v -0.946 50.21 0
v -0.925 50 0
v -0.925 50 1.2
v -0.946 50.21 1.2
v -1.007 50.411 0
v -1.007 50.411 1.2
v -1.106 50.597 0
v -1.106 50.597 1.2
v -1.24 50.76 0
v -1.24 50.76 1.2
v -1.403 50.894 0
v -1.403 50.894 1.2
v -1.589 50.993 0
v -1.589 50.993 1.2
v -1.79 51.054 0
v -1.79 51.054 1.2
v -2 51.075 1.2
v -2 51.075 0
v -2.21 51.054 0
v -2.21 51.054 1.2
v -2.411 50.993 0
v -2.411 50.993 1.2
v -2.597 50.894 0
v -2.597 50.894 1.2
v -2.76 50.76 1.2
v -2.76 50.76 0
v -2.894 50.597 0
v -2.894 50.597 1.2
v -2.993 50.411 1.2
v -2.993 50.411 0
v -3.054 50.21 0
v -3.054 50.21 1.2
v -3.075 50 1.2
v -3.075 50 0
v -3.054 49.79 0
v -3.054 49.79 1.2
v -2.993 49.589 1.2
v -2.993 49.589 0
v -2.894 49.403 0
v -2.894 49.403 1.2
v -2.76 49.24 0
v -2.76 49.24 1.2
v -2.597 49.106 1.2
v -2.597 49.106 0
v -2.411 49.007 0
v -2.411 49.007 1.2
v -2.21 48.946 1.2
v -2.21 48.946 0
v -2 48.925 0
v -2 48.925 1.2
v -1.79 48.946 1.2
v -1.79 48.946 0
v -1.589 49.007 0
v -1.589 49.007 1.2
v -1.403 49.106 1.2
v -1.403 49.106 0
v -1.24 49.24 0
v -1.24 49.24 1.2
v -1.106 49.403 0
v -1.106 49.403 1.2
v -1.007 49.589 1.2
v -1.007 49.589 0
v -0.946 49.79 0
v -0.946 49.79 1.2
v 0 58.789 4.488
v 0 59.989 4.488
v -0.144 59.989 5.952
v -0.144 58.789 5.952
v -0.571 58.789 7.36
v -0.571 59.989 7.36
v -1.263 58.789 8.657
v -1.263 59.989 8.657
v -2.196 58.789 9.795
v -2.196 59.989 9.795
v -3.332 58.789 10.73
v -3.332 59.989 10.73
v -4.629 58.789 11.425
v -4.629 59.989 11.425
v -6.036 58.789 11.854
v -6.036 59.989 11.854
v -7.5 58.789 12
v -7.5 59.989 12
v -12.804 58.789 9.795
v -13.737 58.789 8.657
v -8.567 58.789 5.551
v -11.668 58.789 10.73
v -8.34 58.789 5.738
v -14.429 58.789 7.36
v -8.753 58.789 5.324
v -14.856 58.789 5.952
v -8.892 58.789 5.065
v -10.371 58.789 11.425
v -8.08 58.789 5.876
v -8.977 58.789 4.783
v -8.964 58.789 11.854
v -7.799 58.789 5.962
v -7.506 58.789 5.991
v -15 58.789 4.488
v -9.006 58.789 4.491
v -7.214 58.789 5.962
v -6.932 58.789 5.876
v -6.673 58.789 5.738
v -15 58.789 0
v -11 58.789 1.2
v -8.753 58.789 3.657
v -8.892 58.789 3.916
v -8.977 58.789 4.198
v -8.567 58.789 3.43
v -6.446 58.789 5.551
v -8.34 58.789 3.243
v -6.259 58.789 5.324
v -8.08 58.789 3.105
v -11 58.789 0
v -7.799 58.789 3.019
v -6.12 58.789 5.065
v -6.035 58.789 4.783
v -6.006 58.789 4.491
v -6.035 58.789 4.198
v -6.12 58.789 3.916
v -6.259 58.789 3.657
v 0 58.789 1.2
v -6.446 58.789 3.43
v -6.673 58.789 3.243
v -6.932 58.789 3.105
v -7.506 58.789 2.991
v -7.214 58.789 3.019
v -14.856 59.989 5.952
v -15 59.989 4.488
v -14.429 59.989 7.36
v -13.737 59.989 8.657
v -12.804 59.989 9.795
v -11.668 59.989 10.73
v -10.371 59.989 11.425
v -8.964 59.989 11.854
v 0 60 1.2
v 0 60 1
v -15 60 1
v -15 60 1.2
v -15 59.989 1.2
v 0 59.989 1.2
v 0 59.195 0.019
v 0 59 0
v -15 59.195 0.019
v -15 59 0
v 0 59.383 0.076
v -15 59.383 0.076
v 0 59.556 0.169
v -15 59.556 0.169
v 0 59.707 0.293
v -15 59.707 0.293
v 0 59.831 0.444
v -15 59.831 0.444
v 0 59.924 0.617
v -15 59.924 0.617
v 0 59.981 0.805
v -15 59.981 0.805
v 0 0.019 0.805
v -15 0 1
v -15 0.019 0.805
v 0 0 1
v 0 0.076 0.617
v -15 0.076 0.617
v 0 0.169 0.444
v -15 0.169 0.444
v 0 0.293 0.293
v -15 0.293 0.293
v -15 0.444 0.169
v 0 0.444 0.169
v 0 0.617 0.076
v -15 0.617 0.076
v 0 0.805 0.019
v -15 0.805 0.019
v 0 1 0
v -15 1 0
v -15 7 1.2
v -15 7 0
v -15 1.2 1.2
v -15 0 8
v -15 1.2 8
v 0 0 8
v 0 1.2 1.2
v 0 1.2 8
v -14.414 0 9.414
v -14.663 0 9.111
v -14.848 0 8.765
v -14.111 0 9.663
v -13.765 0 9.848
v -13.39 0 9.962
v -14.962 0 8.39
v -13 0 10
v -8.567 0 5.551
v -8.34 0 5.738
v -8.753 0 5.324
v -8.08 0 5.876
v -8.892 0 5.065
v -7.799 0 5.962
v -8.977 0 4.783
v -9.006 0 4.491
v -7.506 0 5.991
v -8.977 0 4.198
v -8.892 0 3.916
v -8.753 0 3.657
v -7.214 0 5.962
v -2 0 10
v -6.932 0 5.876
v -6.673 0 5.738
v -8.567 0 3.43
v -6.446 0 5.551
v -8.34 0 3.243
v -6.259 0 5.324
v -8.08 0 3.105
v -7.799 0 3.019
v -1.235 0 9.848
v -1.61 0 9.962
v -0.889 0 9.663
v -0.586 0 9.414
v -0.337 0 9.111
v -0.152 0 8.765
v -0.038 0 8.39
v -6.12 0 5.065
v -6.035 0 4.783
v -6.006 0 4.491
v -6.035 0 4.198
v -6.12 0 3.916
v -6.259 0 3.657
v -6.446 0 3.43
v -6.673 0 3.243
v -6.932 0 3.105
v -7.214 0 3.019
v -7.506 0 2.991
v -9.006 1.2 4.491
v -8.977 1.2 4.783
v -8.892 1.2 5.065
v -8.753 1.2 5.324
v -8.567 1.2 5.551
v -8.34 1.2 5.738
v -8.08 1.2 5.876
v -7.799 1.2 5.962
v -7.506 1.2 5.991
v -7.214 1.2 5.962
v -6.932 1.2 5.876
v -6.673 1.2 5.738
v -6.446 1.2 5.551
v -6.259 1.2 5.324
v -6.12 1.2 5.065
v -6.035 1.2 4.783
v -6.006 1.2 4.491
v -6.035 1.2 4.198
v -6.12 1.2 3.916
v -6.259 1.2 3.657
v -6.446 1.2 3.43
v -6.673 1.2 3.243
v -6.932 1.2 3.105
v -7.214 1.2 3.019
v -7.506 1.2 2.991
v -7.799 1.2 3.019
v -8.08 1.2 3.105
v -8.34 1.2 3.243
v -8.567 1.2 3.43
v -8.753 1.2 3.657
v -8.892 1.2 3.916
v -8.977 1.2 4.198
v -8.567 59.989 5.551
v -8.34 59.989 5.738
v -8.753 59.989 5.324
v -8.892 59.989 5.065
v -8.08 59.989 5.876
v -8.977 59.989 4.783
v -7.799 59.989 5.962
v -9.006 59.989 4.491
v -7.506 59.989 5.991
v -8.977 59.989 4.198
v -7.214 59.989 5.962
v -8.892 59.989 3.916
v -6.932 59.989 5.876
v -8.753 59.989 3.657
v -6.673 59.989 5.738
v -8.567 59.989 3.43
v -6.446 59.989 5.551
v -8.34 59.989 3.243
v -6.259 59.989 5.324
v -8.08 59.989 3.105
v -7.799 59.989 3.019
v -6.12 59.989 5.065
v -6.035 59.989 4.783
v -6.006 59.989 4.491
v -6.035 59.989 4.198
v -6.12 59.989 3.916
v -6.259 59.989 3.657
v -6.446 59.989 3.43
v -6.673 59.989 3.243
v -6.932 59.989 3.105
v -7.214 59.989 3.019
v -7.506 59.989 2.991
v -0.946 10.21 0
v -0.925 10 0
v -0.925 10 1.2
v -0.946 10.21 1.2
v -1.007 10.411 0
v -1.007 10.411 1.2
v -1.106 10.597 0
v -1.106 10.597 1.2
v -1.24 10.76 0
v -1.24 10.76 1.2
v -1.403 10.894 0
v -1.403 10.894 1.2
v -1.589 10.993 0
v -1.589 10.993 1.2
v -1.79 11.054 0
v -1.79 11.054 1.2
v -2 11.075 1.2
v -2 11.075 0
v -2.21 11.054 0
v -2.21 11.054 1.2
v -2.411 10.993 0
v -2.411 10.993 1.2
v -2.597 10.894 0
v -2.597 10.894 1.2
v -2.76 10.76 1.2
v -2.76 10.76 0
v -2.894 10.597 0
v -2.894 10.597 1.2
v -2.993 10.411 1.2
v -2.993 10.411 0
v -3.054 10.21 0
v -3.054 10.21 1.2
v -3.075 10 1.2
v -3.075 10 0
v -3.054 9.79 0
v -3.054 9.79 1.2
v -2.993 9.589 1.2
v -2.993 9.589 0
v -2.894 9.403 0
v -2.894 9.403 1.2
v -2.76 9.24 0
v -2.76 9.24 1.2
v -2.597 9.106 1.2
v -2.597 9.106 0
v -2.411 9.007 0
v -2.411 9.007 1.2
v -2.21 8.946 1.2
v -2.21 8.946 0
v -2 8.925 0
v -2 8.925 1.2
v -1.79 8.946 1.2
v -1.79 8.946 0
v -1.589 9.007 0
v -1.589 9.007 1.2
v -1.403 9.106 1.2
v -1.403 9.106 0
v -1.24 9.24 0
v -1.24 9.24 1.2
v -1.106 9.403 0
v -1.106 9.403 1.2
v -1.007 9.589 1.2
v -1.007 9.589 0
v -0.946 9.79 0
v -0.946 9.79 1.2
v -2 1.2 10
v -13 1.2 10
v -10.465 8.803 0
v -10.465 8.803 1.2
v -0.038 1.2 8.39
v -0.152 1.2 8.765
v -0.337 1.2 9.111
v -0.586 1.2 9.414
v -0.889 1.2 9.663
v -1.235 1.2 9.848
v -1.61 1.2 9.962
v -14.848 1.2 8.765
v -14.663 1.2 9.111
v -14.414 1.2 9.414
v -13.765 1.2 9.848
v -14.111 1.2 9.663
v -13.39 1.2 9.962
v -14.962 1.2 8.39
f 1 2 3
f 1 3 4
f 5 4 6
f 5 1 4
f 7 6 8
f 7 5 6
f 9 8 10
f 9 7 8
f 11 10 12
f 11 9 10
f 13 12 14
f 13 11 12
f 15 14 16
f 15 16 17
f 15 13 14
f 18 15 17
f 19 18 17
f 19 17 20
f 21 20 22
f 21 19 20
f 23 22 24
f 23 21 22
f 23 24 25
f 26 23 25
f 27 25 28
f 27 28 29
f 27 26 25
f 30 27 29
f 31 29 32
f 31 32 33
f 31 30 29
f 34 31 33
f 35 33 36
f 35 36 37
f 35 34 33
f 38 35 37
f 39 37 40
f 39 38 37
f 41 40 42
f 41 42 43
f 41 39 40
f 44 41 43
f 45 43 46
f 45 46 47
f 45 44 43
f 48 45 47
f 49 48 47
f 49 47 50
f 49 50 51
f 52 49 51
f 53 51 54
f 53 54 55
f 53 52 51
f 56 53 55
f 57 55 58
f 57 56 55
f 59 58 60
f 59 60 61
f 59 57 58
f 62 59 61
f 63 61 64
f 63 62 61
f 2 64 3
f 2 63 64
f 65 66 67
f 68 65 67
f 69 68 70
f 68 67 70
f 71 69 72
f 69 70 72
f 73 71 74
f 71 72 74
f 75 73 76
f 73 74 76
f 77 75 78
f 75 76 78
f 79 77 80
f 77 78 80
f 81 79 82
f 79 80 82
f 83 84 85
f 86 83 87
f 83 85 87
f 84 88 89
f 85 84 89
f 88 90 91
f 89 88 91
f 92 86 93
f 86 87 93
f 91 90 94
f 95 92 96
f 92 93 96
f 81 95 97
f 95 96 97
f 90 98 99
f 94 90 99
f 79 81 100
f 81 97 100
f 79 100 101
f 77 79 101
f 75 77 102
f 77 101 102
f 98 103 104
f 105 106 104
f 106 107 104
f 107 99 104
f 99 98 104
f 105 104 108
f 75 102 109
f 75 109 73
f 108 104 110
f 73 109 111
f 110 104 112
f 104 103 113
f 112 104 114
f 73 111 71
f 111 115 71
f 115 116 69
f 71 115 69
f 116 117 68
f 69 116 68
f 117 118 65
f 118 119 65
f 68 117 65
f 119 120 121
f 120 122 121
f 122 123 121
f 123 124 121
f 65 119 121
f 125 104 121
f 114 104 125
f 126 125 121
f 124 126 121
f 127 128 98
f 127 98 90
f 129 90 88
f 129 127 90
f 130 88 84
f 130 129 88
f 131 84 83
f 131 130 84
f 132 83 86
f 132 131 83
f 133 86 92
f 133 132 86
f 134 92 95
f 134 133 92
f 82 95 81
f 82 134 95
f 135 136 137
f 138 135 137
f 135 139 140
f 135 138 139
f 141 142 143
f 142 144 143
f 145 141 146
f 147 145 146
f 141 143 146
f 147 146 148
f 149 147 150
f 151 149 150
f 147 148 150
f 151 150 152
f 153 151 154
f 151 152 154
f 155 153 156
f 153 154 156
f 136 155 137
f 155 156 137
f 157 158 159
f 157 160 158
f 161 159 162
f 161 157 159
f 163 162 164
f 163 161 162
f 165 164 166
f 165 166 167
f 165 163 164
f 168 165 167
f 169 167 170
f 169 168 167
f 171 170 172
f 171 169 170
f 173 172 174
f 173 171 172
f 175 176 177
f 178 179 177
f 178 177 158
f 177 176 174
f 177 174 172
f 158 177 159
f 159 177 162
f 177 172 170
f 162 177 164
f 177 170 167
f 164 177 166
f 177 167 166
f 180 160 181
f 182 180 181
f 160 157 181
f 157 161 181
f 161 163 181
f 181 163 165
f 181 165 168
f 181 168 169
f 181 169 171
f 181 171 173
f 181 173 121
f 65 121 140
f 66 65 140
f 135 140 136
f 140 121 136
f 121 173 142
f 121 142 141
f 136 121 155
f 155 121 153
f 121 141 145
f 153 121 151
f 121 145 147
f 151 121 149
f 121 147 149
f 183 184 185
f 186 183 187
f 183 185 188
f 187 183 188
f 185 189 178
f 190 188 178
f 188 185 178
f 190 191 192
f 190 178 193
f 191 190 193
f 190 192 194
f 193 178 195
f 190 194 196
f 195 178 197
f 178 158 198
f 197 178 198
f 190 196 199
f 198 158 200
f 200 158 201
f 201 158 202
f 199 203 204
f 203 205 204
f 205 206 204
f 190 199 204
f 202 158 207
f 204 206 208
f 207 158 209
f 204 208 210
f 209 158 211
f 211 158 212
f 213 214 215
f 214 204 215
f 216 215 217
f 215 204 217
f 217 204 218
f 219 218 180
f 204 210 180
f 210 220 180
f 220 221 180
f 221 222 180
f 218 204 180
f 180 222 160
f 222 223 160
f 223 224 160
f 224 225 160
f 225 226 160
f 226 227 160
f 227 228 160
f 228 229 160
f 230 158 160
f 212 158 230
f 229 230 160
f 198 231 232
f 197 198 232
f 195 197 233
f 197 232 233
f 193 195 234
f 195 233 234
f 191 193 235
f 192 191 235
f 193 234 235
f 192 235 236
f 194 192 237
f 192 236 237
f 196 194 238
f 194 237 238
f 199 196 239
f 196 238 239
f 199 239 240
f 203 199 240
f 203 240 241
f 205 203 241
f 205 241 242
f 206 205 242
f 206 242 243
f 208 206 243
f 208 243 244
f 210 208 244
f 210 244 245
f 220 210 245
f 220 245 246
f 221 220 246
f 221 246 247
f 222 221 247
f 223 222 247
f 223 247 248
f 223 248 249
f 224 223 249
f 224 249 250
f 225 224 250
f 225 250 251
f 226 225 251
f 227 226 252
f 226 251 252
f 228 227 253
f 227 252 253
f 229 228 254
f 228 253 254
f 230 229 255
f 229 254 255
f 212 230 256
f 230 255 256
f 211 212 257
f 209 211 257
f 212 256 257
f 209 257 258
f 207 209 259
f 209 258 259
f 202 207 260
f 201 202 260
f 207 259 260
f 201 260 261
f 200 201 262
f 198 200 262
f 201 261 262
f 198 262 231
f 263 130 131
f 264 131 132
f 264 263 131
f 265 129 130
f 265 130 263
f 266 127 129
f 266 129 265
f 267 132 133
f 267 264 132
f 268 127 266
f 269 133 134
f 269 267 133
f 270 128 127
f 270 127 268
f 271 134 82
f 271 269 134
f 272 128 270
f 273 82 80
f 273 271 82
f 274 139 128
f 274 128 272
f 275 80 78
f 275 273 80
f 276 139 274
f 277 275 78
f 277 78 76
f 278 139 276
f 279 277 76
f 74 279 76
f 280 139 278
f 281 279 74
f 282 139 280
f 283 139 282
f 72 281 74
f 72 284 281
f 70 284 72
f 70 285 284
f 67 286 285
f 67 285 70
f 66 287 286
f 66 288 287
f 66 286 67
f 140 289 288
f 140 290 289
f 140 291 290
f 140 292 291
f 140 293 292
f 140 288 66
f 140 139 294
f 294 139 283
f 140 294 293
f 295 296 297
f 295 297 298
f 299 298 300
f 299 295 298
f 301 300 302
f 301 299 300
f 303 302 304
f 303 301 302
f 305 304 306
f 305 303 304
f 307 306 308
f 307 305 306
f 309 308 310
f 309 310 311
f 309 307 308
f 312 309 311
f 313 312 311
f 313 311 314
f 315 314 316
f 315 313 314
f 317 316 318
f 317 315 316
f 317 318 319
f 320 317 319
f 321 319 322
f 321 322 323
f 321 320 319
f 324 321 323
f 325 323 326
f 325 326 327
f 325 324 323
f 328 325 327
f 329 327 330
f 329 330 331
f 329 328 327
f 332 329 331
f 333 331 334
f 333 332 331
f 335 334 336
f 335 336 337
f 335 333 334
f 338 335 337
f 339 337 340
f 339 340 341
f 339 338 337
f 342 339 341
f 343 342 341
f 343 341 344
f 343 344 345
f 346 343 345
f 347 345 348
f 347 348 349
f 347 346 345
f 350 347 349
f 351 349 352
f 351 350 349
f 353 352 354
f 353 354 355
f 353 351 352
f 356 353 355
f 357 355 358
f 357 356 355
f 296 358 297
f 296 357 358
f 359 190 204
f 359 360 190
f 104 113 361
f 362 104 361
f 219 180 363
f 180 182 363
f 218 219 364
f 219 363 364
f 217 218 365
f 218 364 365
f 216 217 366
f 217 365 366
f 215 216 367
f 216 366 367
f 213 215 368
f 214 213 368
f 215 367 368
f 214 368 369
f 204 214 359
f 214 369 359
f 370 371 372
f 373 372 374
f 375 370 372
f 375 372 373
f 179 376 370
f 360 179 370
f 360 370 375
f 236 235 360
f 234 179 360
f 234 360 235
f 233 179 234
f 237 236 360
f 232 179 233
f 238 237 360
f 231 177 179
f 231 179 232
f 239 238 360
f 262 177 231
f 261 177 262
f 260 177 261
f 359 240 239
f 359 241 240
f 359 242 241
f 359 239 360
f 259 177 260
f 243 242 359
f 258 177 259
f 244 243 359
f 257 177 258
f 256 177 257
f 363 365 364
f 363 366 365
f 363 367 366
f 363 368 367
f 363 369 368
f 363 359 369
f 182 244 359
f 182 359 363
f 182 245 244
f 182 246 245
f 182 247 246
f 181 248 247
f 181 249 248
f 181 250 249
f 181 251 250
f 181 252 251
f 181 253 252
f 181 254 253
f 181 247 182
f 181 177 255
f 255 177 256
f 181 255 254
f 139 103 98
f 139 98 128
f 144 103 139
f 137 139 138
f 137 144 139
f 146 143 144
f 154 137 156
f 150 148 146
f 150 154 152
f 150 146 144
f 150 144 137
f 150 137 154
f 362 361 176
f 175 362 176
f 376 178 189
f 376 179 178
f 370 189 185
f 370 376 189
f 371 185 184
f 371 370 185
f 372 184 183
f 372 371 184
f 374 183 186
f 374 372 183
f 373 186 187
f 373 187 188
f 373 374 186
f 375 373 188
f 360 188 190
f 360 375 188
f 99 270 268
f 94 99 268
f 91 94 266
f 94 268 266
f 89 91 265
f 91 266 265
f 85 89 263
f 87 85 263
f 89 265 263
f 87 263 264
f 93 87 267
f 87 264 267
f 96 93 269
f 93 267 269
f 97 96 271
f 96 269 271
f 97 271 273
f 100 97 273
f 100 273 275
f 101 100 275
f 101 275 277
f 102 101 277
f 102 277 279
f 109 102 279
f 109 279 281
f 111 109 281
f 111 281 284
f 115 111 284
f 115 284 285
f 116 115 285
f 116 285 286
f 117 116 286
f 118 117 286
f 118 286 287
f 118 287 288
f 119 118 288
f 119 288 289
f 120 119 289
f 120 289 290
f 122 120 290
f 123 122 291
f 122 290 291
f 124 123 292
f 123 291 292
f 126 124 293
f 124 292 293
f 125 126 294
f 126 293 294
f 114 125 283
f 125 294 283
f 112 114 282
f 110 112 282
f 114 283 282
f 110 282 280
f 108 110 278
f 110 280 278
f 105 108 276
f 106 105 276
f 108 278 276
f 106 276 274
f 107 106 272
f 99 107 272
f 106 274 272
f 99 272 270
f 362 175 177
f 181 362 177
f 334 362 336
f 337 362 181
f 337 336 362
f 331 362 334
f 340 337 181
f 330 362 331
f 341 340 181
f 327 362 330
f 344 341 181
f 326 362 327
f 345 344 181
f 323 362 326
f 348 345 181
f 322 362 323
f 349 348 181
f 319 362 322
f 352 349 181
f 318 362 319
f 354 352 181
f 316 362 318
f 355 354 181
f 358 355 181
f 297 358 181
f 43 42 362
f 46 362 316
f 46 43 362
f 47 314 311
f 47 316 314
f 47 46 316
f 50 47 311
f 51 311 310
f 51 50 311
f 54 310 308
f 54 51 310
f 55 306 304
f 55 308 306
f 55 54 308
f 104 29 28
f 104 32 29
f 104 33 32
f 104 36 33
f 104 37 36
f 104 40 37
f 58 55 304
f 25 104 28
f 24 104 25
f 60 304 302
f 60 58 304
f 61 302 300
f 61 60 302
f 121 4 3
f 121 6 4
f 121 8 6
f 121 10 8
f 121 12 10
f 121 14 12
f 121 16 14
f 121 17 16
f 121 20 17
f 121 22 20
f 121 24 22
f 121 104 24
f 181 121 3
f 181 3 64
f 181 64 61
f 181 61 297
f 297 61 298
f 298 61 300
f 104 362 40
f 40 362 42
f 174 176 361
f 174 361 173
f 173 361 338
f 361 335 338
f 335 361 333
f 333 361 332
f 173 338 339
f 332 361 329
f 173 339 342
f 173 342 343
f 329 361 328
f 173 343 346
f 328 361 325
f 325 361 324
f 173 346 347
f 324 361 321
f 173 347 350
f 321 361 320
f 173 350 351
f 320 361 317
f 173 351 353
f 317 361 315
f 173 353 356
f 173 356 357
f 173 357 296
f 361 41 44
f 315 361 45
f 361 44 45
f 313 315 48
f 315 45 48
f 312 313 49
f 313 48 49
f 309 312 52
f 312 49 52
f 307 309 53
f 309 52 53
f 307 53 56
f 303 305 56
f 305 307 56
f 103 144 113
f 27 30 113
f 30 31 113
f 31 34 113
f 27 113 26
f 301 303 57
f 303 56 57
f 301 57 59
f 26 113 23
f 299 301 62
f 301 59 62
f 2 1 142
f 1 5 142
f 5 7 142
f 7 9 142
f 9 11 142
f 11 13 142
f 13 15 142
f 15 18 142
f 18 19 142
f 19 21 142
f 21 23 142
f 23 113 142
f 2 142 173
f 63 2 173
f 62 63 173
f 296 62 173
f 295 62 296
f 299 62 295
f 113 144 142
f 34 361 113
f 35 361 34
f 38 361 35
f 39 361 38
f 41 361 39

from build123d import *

# Parameters (mm, degrees)
F0_R        = 1.075
F3_DEPTH    = 1.2
F2_W        = 15
F2_H        = 1.2
F4_DEPTH    = 10
F1_W        = 15
F1_H        = 1.2
F5_DEPTH    = 12
F6_T1_DEPTH = 38.762491
F7_R        = 2
F8_R        = 1
F10_D       = 3


# Not quite as in the source:
# - a fillet or chamfer that OpenCascade refuses, or shapes differently, is made with other operations: its cross-section is extruded or revolved along the edge and cut away or added


with BuildPart() as f3:
    # F0 (on Top) → F3 (new body)
    with BuildSketch(Plane.XY):
        Polygon((-15, 0), (0, 0), (0, 60), (-15, 60), (-15, 58.8), (-11, 58.8), (-10.4650629229, 8.8028616587), (-15, 7), align=None)
        with Locations((-2, 10)):
            Circle(F0_R, mode=Mode.SUBTRACT)
        with Locations((-2, 50)):
            Circle(F0_R, mode=Mode.SUBTRACT)
    extrude(amount=F3_DEPTH)

    # F2 (on face) → F4 (join)
    with BuildSketch(Plane.XY):
        with Locations((-7.5, 0.6)):
            Rectangle(F2_W, F2_H)
    extrude(amount=F4_DEPTH)

    # F1 (on face) → F5 (join)
    with BuildSketch(Plane.XY):
        with Locations((-7.5, 59.3886146865)):
            Rectangle(F1_W, F1_H)
    extrude(amount=F5_DEPTH)

    # F6: fillet of radius 7.5124982 on 2 edges, made by hand

    # F6_s2 → F6_t1 (cut)
    with BuildSketch(Plane.XZ.offset(-78.7698601865)):
        with BuildLine():
            ThreePointArc((0, 4.4875018), (-2.2003597791, 9.7996402209), (-7.5124982, 12))
            Line((-7.5124982, 12), (0, 12))
            Line((0, 12), (0, 4.4875018))
        make_face()
        with BuildLine():
            ThreePointArc((-15, 4.4875018), (-12.7996402209, 9.7996402209), (-7.4875018, 12))
            Line((-7.4875018, 12), (-15, 12))
            Line((-15, 12), (-15, 4.4875018))
        make_face()
    extrude(amount=F6_T1_DEPTH, mode=Mode.SUBTRACT)

    # F7
    f7_edges = [f3.edges().sort_by_distance(p)[0] for p in [
        (0, 0.6, 10),
        (-15, 0.6, 10),
    ]]
    fillet(f7_edges, radius=F7_R)

    # F8
    f8_edges = [f3.edges().sort_by_distance(p)[0] for p in [
        (-7.5, 0, 0),
        (-7.5, 60, 0),
    ]]
    fillet(f8_edges, radius=F8_R)

    # F10 (through all)
    with Locations(Plane.XZ):
        with Locations((-7.506201975, 4.490504507)):
            Hole(F10_D / 2)


solid = f3.part
